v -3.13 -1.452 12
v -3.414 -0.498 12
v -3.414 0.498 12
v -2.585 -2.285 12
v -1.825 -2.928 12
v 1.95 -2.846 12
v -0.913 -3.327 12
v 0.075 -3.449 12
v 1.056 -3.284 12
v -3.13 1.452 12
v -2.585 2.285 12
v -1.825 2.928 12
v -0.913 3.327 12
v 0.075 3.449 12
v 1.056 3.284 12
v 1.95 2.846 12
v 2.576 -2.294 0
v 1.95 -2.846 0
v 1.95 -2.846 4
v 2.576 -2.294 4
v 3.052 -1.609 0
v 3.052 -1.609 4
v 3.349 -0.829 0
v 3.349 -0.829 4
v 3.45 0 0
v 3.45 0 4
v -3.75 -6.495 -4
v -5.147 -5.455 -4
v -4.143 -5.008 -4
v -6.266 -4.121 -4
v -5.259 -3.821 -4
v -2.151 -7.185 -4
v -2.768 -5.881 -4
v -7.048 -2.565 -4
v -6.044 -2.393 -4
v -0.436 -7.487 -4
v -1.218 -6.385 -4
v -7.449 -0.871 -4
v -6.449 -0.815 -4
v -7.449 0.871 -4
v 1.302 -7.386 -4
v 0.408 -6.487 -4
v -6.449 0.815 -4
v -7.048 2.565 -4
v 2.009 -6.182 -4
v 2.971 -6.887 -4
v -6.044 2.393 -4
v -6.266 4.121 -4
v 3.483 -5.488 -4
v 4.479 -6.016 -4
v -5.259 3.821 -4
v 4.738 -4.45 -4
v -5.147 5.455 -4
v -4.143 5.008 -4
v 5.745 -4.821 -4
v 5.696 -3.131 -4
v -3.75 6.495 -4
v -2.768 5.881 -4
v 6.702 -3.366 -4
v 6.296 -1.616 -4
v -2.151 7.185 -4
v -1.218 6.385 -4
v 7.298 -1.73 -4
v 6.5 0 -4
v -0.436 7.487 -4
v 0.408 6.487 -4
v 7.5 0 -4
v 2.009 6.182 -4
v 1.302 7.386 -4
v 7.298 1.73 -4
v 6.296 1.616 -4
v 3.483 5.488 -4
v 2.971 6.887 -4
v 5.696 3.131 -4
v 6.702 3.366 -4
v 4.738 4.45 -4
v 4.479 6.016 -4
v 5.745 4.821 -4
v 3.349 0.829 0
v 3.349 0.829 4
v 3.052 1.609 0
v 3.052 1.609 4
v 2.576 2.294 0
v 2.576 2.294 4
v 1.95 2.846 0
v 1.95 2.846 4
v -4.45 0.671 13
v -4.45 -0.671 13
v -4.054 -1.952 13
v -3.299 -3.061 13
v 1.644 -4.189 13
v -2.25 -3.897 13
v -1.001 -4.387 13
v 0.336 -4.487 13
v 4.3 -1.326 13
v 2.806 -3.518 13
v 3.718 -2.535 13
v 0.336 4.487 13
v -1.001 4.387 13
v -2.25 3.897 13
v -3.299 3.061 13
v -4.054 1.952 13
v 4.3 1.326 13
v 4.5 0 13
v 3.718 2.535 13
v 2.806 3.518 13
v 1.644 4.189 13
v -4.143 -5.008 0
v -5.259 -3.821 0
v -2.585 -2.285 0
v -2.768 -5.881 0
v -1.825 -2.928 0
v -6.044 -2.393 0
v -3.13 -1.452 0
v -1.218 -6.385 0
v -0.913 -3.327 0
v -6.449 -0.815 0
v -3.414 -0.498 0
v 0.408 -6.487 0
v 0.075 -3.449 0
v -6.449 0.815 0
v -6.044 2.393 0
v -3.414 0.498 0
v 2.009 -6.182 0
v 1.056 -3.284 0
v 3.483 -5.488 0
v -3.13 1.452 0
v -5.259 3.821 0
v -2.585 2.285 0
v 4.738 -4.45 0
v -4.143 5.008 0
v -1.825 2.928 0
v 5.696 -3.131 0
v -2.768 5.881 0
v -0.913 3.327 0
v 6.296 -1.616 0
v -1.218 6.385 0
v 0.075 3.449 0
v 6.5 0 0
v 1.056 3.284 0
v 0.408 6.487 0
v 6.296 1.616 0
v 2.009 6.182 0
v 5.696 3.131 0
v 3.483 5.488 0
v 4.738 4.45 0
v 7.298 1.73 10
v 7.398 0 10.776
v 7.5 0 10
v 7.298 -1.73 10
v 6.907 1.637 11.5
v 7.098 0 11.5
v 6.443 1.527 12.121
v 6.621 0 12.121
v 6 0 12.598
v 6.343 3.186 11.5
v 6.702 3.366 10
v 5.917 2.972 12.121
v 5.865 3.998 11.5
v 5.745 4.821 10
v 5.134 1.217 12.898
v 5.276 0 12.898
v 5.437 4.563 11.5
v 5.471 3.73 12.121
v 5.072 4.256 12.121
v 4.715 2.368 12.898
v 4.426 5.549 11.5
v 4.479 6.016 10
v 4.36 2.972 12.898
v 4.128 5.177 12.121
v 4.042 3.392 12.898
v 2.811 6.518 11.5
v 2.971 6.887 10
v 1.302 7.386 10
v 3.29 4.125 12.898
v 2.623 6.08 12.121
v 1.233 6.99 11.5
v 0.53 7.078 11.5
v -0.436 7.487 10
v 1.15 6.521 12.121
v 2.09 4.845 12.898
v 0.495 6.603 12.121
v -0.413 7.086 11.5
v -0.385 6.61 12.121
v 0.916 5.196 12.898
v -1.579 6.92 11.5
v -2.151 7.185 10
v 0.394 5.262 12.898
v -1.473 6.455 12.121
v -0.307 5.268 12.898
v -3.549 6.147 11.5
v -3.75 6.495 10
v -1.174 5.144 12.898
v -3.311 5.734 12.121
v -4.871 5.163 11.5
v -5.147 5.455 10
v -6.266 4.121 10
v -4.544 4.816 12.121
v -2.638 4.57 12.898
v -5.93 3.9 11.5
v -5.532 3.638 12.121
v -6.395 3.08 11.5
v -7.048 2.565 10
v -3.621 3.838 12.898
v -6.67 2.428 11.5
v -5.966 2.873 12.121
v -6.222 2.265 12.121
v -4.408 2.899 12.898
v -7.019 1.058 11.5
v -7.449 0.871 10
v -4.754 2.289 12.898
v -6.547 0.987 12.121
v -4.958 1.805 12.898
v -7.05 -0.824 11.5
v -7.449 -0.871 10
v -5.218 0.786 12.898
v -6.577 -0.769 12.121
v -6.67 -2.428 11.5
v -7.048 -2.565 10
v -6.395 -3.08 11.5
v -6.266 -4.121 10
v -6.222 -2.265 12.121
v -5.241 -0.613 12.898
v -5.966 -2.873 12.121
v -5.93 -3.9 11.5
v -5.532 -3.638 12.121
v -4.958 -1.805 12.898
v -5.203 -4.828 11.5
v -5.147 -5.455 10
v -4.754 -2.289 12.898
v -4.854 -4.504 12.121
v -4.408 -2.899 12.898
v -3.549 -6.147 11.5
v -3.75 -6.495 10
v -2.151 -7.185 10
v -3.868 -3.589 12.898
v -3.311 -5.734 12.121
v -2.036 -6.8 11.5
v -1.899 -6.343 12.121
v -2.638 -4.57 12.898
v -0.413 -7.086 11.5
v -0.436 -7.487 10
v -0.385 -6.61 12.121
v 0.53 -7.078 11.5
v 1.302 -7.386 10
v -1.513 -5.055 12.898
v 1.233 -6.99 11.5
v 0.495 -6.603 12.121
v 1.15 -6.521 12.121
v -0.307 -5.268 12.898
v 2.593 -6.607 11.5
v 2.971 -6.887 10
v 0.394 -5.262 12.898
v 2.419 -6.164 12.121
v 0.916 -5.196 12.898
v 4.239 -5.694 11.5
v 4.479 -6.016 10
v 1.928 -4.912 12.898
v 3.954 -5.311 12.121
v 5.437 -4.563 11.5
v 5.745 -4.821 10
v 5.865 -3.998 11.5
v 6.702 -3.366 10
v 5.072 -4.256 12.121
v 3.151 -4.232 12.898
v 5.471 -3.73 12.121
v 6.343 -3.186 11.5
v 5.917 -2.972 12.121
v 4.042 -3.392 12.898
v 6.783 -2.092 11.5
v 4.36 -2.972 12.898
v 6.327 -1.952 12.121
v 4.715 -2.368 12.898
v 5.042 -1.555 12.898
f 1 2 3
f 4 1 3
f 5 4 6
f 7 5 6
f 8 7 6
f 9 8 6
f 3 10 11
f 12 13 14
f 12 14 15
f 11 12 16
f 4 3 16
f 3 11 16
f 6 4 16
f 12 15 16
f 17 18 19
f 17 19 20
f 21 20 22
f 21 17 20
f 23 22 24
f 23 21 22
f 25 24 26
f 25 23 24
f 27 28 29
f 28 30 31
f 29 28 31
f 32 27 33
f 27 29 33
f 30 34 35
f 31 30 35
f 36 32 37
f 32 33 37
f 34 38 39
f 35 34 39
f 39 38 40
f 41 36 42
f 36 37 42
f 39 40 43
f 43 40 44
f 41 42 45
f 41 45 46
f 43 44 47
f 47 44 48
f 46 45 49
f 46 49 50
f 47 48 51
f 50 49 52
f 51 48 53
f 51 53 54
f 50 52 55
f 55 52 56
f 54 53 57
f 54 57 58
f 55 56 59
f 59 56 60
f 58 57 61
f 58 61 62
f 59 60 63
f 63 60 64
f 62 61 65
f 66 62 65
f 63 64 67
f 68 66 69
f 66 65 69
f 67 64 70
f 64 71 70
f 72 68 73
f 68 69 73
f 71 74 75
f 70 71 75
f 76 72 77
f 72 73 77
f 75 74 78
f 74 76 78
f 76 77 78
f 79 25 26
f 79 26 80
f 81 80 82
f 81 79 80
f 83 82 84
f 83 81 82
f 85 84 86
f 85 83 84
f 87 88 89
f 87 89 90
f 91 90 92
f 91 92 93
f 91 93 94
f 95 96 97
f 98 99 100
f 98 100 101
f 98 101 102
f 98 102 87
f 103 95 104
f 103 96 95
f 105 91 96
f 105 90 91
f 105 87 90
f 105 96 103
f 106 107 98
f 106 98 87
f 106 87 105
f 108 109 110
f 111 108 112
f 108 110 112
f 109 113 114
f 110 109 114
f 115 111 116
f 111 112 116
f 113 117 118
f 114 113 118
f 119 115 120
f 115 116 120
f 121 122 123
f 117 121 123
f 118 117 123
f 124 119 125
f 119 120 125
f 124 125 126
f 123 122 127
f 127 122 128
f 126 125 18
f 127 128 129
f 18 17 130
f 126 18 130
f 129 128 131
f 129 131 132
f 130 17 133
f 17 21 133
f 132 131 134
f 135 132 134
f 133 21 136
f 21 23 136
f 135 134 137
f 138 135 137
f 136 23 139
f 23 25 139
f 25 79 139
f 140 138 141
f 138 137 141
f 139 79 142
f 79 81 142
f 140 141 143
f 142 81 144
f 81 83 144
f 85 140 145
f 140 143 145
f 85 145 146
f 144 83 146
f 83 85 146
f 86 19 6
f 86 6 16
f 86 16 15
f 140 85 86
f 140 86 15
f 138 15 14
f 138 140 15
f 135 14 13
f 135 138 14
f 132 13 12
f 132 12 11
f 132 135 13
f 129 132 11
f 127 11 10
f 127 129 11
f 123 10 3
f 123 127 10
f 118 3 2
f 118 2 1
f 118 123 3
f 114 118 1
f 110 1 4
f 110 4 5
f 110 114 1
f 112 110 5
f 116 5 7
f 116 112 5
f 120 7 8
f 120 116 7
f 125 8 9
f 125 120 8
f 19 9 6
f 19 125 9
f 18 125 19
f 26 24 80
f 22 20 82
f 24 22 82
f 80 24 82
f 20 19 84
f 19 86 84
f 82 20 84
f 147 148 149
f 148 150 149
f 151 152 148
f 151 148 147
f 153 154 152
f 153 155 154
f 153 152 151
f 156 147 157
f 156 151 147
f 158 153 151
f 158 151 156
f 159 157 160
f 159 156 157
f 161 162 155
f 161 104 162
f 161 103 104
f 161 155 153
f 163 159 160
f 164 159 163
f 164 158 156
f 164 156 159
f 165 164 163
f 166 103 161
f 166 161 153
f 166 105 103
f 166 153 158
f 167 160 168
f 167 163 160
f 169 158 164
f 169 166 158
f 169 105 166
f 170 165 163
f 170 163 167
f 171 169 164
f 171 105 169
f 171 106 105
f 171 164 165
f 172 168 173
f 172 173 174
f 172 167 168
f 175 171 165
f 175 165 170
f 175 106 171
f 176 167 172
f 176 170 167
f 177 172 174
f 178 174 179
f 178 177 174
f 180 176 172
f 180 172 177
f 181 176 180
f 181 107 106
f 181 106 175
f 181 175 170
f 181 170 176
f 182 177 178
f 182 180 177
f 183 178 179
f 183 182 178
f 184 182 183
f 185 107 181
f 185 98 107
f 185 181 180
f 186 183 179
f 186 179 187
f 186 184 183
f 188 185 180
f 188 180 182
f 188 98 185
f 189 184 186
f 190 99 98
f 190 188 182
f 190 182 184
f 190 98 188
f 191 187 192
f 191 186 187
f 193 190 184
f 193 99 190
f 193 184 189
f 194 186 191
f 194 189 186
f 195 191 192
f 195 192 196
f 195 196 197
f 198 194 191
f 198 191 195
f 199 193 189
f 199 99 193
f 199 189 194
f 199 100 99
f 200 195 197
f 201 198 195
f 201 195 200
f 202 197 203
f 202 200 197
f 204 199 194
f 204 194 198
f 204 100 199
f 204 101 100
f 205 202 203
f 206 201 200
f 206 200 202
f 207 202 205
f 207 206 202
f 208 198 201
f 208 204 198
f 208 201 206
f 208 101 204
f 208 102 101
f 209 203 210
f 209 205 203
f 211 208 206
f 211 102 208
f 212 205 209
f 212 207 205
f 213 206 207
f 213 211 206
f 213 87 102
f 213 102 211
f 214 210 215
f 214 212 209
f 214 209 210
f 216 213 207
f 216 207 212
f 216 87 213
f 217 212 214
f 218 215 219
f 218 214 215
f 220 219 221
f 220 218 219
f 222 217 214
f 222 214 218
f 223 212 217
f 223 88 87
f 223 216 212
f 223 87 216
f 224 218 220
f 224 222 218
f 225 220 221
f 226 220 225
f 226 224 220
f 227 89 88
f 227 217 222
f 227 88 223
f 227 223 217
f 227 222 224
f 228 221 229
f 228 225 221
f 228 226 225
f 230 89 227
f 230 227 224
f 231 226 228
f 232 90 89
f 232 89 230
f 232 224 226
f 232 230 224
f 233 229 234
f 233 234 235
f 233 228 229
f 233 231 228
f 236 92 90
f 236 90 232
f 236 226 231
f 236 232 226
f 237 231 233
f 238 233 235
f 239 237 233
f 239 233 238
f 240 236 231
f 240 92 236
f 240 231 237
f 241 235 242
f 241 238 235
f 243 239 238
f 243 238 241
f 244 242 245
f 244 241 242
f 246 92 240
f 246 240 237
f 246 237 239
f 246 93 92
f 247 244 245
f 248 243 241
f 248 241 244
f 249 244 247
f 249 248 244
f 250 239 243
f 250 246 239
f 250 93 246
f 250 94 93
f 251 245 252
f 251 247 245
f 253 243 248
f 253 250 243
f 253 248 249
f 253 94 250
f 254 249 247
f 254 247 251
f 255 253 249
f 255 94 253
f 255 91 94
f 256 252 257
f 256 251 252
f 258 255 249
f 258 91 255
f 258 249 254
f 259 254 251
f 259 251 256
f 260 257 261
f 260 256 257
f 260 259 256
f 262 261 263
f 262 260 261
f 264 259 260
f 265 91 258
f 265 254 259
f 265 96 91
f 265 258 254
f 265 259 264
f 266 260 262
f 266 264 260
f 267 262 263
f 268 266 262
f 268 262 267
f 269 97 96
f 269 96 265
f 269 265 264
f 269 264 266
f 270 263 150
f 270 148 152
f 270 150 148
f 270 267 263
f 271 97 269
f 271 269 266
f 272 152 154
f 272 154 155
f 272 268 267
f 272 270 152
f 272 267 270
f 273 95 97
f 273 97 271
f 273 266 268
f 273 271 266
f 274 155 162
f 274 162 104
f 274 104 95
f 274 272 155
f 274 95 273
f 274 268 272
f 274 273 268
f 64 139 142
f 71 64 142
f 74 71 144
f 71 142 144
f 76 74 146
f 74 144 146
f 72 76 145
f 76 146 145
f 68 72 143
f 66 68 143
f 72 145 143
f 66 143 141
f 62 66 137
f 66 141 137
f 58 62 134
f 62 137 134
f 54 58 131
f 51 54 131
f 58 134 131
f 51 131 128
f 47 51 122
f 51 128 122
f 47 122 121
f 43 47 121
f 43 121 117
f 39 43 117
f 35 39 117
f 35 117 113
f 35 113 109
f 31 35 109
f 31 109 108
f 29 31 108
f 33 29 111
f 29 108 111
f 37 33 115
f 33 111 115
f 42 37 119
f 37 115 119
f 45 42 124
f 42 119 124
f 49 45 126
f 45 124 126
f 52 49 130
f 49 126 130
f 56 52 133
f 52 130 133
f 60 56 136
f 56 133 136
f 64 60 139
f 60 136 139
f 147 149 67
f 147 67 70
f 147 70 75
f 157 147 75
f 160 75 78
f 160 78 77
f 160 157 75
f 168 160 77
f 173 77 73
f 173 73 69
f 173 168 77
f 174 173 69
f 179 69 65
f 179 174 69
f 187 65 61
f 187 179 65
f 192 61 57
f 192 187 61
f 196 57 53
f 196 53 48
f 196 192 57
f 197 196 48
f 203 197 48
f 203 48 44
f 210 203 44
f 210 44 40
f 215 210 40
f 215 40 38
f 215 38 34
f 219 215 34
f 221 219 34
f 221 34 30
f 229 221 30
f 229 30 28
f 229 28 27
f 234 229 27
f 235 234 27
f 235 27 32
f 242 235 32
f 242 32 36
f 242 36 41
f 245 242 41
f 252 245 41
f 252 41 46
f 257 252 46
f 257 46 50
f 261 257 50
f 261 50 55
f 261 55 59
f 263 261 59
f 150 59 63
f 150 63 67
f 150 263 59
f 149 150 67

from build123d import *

# Parameters (mm, degrees)
F0_R     = 7.5
F0_R_2   = 6.5
F1_DEPTH = 13
F2_DEPTH = 12
F3_DEPTH = 4
F4_DEPTH = 4
F5_R     = 3


with BuildPart() as f1:
    # F0 (on Top) → F1 (new body)
    with BuildSketch(Plane.XY):
        Circle(F0_R)
        Circle(F0_R_2, mode=Mode.SUBTRACT)
        Circle(F0_R_2)
        with BuildLine():
            ThreePointArc((1.95, 2.8460498942), (3.0520484924, 1.6085707942), (3.45, 0))
            ThreePointArc((3.45, 0), (3.0520484924, -1.6085707942), (1.95, -2.8460498942))
            ThreePointArc((1.95, -2.8460498942), (-3.45, 0), (1.95, 2.8460498942))
        make_face(mode=Mode.SUBTRACT)
        with BuildLine():
            Line((1.95, -2.8460498942), (1.95, 2.8460498942))
            ThreePointArc((1.95, 2.8460498942), (-3.45, 0), (1.95, -2.8460498942))
        make_face()
        with BuildLine():
            ThreePointArc((1.95, -2.8460498942), (3.0520484924, -1.6085707942), (3.45, 0))
            ThreePointArc((3.45, 0), (3.0520484924, 1.6085707942), (1.95, 2.8460498942))
            Line((1.95, 2.8460498942), (1.95, -2.8460498942))
        make_face()
    extrude(amount=F1_DEPTH)

    # F0 (on Top) → F2 (cut)
    with BuildSketch(Plane.XY):
        with BuildLine():
            Line((1.95, -2.8460498942), (1.95, 2.8460498942))
            ThreePointArc((1.95, 2.8460498942), (-3.45, 0), (1.95, -2.8460498942))
        make_face()
    extrude(amount=F2_DEPTH, mode=Mode.SUBTRACT)

    # F0 (on Top) → F3 (cut)
    with BuildSketch(Plane.XY):
        with BuildLine():
            ThreePointArc((1.95, -2.8460498942), (3.0520484924, -1.6085707942), (3.45, 0))
            ThreePointArc((3.45, 0), (3.0520484924, 1.6085707942), (1.95, 2.8460498942))
            Line((1.95, 2.8460498942), (1.95, -2.8460498942))
        make_face()
    extrude(amount=F3_DEPTH, mode=Mode.SUBTRACT)

    # F0 (on Top) → F4 (join)
    with BuildSketch(Plane.XY):
        Circle(F0_R)
        Circle(F0_R_2, mode=Mode.SUBTRACT)
    extrude(amount=-F4_DEPTH)

    # F5
    f5_edges = [f1.edges().sort_by_distance(p)[0] for p in [
        (-7.5, 0, 13),
    ]]
    fillet(f5_edges, radius=F5_R)


solid = f1.part
